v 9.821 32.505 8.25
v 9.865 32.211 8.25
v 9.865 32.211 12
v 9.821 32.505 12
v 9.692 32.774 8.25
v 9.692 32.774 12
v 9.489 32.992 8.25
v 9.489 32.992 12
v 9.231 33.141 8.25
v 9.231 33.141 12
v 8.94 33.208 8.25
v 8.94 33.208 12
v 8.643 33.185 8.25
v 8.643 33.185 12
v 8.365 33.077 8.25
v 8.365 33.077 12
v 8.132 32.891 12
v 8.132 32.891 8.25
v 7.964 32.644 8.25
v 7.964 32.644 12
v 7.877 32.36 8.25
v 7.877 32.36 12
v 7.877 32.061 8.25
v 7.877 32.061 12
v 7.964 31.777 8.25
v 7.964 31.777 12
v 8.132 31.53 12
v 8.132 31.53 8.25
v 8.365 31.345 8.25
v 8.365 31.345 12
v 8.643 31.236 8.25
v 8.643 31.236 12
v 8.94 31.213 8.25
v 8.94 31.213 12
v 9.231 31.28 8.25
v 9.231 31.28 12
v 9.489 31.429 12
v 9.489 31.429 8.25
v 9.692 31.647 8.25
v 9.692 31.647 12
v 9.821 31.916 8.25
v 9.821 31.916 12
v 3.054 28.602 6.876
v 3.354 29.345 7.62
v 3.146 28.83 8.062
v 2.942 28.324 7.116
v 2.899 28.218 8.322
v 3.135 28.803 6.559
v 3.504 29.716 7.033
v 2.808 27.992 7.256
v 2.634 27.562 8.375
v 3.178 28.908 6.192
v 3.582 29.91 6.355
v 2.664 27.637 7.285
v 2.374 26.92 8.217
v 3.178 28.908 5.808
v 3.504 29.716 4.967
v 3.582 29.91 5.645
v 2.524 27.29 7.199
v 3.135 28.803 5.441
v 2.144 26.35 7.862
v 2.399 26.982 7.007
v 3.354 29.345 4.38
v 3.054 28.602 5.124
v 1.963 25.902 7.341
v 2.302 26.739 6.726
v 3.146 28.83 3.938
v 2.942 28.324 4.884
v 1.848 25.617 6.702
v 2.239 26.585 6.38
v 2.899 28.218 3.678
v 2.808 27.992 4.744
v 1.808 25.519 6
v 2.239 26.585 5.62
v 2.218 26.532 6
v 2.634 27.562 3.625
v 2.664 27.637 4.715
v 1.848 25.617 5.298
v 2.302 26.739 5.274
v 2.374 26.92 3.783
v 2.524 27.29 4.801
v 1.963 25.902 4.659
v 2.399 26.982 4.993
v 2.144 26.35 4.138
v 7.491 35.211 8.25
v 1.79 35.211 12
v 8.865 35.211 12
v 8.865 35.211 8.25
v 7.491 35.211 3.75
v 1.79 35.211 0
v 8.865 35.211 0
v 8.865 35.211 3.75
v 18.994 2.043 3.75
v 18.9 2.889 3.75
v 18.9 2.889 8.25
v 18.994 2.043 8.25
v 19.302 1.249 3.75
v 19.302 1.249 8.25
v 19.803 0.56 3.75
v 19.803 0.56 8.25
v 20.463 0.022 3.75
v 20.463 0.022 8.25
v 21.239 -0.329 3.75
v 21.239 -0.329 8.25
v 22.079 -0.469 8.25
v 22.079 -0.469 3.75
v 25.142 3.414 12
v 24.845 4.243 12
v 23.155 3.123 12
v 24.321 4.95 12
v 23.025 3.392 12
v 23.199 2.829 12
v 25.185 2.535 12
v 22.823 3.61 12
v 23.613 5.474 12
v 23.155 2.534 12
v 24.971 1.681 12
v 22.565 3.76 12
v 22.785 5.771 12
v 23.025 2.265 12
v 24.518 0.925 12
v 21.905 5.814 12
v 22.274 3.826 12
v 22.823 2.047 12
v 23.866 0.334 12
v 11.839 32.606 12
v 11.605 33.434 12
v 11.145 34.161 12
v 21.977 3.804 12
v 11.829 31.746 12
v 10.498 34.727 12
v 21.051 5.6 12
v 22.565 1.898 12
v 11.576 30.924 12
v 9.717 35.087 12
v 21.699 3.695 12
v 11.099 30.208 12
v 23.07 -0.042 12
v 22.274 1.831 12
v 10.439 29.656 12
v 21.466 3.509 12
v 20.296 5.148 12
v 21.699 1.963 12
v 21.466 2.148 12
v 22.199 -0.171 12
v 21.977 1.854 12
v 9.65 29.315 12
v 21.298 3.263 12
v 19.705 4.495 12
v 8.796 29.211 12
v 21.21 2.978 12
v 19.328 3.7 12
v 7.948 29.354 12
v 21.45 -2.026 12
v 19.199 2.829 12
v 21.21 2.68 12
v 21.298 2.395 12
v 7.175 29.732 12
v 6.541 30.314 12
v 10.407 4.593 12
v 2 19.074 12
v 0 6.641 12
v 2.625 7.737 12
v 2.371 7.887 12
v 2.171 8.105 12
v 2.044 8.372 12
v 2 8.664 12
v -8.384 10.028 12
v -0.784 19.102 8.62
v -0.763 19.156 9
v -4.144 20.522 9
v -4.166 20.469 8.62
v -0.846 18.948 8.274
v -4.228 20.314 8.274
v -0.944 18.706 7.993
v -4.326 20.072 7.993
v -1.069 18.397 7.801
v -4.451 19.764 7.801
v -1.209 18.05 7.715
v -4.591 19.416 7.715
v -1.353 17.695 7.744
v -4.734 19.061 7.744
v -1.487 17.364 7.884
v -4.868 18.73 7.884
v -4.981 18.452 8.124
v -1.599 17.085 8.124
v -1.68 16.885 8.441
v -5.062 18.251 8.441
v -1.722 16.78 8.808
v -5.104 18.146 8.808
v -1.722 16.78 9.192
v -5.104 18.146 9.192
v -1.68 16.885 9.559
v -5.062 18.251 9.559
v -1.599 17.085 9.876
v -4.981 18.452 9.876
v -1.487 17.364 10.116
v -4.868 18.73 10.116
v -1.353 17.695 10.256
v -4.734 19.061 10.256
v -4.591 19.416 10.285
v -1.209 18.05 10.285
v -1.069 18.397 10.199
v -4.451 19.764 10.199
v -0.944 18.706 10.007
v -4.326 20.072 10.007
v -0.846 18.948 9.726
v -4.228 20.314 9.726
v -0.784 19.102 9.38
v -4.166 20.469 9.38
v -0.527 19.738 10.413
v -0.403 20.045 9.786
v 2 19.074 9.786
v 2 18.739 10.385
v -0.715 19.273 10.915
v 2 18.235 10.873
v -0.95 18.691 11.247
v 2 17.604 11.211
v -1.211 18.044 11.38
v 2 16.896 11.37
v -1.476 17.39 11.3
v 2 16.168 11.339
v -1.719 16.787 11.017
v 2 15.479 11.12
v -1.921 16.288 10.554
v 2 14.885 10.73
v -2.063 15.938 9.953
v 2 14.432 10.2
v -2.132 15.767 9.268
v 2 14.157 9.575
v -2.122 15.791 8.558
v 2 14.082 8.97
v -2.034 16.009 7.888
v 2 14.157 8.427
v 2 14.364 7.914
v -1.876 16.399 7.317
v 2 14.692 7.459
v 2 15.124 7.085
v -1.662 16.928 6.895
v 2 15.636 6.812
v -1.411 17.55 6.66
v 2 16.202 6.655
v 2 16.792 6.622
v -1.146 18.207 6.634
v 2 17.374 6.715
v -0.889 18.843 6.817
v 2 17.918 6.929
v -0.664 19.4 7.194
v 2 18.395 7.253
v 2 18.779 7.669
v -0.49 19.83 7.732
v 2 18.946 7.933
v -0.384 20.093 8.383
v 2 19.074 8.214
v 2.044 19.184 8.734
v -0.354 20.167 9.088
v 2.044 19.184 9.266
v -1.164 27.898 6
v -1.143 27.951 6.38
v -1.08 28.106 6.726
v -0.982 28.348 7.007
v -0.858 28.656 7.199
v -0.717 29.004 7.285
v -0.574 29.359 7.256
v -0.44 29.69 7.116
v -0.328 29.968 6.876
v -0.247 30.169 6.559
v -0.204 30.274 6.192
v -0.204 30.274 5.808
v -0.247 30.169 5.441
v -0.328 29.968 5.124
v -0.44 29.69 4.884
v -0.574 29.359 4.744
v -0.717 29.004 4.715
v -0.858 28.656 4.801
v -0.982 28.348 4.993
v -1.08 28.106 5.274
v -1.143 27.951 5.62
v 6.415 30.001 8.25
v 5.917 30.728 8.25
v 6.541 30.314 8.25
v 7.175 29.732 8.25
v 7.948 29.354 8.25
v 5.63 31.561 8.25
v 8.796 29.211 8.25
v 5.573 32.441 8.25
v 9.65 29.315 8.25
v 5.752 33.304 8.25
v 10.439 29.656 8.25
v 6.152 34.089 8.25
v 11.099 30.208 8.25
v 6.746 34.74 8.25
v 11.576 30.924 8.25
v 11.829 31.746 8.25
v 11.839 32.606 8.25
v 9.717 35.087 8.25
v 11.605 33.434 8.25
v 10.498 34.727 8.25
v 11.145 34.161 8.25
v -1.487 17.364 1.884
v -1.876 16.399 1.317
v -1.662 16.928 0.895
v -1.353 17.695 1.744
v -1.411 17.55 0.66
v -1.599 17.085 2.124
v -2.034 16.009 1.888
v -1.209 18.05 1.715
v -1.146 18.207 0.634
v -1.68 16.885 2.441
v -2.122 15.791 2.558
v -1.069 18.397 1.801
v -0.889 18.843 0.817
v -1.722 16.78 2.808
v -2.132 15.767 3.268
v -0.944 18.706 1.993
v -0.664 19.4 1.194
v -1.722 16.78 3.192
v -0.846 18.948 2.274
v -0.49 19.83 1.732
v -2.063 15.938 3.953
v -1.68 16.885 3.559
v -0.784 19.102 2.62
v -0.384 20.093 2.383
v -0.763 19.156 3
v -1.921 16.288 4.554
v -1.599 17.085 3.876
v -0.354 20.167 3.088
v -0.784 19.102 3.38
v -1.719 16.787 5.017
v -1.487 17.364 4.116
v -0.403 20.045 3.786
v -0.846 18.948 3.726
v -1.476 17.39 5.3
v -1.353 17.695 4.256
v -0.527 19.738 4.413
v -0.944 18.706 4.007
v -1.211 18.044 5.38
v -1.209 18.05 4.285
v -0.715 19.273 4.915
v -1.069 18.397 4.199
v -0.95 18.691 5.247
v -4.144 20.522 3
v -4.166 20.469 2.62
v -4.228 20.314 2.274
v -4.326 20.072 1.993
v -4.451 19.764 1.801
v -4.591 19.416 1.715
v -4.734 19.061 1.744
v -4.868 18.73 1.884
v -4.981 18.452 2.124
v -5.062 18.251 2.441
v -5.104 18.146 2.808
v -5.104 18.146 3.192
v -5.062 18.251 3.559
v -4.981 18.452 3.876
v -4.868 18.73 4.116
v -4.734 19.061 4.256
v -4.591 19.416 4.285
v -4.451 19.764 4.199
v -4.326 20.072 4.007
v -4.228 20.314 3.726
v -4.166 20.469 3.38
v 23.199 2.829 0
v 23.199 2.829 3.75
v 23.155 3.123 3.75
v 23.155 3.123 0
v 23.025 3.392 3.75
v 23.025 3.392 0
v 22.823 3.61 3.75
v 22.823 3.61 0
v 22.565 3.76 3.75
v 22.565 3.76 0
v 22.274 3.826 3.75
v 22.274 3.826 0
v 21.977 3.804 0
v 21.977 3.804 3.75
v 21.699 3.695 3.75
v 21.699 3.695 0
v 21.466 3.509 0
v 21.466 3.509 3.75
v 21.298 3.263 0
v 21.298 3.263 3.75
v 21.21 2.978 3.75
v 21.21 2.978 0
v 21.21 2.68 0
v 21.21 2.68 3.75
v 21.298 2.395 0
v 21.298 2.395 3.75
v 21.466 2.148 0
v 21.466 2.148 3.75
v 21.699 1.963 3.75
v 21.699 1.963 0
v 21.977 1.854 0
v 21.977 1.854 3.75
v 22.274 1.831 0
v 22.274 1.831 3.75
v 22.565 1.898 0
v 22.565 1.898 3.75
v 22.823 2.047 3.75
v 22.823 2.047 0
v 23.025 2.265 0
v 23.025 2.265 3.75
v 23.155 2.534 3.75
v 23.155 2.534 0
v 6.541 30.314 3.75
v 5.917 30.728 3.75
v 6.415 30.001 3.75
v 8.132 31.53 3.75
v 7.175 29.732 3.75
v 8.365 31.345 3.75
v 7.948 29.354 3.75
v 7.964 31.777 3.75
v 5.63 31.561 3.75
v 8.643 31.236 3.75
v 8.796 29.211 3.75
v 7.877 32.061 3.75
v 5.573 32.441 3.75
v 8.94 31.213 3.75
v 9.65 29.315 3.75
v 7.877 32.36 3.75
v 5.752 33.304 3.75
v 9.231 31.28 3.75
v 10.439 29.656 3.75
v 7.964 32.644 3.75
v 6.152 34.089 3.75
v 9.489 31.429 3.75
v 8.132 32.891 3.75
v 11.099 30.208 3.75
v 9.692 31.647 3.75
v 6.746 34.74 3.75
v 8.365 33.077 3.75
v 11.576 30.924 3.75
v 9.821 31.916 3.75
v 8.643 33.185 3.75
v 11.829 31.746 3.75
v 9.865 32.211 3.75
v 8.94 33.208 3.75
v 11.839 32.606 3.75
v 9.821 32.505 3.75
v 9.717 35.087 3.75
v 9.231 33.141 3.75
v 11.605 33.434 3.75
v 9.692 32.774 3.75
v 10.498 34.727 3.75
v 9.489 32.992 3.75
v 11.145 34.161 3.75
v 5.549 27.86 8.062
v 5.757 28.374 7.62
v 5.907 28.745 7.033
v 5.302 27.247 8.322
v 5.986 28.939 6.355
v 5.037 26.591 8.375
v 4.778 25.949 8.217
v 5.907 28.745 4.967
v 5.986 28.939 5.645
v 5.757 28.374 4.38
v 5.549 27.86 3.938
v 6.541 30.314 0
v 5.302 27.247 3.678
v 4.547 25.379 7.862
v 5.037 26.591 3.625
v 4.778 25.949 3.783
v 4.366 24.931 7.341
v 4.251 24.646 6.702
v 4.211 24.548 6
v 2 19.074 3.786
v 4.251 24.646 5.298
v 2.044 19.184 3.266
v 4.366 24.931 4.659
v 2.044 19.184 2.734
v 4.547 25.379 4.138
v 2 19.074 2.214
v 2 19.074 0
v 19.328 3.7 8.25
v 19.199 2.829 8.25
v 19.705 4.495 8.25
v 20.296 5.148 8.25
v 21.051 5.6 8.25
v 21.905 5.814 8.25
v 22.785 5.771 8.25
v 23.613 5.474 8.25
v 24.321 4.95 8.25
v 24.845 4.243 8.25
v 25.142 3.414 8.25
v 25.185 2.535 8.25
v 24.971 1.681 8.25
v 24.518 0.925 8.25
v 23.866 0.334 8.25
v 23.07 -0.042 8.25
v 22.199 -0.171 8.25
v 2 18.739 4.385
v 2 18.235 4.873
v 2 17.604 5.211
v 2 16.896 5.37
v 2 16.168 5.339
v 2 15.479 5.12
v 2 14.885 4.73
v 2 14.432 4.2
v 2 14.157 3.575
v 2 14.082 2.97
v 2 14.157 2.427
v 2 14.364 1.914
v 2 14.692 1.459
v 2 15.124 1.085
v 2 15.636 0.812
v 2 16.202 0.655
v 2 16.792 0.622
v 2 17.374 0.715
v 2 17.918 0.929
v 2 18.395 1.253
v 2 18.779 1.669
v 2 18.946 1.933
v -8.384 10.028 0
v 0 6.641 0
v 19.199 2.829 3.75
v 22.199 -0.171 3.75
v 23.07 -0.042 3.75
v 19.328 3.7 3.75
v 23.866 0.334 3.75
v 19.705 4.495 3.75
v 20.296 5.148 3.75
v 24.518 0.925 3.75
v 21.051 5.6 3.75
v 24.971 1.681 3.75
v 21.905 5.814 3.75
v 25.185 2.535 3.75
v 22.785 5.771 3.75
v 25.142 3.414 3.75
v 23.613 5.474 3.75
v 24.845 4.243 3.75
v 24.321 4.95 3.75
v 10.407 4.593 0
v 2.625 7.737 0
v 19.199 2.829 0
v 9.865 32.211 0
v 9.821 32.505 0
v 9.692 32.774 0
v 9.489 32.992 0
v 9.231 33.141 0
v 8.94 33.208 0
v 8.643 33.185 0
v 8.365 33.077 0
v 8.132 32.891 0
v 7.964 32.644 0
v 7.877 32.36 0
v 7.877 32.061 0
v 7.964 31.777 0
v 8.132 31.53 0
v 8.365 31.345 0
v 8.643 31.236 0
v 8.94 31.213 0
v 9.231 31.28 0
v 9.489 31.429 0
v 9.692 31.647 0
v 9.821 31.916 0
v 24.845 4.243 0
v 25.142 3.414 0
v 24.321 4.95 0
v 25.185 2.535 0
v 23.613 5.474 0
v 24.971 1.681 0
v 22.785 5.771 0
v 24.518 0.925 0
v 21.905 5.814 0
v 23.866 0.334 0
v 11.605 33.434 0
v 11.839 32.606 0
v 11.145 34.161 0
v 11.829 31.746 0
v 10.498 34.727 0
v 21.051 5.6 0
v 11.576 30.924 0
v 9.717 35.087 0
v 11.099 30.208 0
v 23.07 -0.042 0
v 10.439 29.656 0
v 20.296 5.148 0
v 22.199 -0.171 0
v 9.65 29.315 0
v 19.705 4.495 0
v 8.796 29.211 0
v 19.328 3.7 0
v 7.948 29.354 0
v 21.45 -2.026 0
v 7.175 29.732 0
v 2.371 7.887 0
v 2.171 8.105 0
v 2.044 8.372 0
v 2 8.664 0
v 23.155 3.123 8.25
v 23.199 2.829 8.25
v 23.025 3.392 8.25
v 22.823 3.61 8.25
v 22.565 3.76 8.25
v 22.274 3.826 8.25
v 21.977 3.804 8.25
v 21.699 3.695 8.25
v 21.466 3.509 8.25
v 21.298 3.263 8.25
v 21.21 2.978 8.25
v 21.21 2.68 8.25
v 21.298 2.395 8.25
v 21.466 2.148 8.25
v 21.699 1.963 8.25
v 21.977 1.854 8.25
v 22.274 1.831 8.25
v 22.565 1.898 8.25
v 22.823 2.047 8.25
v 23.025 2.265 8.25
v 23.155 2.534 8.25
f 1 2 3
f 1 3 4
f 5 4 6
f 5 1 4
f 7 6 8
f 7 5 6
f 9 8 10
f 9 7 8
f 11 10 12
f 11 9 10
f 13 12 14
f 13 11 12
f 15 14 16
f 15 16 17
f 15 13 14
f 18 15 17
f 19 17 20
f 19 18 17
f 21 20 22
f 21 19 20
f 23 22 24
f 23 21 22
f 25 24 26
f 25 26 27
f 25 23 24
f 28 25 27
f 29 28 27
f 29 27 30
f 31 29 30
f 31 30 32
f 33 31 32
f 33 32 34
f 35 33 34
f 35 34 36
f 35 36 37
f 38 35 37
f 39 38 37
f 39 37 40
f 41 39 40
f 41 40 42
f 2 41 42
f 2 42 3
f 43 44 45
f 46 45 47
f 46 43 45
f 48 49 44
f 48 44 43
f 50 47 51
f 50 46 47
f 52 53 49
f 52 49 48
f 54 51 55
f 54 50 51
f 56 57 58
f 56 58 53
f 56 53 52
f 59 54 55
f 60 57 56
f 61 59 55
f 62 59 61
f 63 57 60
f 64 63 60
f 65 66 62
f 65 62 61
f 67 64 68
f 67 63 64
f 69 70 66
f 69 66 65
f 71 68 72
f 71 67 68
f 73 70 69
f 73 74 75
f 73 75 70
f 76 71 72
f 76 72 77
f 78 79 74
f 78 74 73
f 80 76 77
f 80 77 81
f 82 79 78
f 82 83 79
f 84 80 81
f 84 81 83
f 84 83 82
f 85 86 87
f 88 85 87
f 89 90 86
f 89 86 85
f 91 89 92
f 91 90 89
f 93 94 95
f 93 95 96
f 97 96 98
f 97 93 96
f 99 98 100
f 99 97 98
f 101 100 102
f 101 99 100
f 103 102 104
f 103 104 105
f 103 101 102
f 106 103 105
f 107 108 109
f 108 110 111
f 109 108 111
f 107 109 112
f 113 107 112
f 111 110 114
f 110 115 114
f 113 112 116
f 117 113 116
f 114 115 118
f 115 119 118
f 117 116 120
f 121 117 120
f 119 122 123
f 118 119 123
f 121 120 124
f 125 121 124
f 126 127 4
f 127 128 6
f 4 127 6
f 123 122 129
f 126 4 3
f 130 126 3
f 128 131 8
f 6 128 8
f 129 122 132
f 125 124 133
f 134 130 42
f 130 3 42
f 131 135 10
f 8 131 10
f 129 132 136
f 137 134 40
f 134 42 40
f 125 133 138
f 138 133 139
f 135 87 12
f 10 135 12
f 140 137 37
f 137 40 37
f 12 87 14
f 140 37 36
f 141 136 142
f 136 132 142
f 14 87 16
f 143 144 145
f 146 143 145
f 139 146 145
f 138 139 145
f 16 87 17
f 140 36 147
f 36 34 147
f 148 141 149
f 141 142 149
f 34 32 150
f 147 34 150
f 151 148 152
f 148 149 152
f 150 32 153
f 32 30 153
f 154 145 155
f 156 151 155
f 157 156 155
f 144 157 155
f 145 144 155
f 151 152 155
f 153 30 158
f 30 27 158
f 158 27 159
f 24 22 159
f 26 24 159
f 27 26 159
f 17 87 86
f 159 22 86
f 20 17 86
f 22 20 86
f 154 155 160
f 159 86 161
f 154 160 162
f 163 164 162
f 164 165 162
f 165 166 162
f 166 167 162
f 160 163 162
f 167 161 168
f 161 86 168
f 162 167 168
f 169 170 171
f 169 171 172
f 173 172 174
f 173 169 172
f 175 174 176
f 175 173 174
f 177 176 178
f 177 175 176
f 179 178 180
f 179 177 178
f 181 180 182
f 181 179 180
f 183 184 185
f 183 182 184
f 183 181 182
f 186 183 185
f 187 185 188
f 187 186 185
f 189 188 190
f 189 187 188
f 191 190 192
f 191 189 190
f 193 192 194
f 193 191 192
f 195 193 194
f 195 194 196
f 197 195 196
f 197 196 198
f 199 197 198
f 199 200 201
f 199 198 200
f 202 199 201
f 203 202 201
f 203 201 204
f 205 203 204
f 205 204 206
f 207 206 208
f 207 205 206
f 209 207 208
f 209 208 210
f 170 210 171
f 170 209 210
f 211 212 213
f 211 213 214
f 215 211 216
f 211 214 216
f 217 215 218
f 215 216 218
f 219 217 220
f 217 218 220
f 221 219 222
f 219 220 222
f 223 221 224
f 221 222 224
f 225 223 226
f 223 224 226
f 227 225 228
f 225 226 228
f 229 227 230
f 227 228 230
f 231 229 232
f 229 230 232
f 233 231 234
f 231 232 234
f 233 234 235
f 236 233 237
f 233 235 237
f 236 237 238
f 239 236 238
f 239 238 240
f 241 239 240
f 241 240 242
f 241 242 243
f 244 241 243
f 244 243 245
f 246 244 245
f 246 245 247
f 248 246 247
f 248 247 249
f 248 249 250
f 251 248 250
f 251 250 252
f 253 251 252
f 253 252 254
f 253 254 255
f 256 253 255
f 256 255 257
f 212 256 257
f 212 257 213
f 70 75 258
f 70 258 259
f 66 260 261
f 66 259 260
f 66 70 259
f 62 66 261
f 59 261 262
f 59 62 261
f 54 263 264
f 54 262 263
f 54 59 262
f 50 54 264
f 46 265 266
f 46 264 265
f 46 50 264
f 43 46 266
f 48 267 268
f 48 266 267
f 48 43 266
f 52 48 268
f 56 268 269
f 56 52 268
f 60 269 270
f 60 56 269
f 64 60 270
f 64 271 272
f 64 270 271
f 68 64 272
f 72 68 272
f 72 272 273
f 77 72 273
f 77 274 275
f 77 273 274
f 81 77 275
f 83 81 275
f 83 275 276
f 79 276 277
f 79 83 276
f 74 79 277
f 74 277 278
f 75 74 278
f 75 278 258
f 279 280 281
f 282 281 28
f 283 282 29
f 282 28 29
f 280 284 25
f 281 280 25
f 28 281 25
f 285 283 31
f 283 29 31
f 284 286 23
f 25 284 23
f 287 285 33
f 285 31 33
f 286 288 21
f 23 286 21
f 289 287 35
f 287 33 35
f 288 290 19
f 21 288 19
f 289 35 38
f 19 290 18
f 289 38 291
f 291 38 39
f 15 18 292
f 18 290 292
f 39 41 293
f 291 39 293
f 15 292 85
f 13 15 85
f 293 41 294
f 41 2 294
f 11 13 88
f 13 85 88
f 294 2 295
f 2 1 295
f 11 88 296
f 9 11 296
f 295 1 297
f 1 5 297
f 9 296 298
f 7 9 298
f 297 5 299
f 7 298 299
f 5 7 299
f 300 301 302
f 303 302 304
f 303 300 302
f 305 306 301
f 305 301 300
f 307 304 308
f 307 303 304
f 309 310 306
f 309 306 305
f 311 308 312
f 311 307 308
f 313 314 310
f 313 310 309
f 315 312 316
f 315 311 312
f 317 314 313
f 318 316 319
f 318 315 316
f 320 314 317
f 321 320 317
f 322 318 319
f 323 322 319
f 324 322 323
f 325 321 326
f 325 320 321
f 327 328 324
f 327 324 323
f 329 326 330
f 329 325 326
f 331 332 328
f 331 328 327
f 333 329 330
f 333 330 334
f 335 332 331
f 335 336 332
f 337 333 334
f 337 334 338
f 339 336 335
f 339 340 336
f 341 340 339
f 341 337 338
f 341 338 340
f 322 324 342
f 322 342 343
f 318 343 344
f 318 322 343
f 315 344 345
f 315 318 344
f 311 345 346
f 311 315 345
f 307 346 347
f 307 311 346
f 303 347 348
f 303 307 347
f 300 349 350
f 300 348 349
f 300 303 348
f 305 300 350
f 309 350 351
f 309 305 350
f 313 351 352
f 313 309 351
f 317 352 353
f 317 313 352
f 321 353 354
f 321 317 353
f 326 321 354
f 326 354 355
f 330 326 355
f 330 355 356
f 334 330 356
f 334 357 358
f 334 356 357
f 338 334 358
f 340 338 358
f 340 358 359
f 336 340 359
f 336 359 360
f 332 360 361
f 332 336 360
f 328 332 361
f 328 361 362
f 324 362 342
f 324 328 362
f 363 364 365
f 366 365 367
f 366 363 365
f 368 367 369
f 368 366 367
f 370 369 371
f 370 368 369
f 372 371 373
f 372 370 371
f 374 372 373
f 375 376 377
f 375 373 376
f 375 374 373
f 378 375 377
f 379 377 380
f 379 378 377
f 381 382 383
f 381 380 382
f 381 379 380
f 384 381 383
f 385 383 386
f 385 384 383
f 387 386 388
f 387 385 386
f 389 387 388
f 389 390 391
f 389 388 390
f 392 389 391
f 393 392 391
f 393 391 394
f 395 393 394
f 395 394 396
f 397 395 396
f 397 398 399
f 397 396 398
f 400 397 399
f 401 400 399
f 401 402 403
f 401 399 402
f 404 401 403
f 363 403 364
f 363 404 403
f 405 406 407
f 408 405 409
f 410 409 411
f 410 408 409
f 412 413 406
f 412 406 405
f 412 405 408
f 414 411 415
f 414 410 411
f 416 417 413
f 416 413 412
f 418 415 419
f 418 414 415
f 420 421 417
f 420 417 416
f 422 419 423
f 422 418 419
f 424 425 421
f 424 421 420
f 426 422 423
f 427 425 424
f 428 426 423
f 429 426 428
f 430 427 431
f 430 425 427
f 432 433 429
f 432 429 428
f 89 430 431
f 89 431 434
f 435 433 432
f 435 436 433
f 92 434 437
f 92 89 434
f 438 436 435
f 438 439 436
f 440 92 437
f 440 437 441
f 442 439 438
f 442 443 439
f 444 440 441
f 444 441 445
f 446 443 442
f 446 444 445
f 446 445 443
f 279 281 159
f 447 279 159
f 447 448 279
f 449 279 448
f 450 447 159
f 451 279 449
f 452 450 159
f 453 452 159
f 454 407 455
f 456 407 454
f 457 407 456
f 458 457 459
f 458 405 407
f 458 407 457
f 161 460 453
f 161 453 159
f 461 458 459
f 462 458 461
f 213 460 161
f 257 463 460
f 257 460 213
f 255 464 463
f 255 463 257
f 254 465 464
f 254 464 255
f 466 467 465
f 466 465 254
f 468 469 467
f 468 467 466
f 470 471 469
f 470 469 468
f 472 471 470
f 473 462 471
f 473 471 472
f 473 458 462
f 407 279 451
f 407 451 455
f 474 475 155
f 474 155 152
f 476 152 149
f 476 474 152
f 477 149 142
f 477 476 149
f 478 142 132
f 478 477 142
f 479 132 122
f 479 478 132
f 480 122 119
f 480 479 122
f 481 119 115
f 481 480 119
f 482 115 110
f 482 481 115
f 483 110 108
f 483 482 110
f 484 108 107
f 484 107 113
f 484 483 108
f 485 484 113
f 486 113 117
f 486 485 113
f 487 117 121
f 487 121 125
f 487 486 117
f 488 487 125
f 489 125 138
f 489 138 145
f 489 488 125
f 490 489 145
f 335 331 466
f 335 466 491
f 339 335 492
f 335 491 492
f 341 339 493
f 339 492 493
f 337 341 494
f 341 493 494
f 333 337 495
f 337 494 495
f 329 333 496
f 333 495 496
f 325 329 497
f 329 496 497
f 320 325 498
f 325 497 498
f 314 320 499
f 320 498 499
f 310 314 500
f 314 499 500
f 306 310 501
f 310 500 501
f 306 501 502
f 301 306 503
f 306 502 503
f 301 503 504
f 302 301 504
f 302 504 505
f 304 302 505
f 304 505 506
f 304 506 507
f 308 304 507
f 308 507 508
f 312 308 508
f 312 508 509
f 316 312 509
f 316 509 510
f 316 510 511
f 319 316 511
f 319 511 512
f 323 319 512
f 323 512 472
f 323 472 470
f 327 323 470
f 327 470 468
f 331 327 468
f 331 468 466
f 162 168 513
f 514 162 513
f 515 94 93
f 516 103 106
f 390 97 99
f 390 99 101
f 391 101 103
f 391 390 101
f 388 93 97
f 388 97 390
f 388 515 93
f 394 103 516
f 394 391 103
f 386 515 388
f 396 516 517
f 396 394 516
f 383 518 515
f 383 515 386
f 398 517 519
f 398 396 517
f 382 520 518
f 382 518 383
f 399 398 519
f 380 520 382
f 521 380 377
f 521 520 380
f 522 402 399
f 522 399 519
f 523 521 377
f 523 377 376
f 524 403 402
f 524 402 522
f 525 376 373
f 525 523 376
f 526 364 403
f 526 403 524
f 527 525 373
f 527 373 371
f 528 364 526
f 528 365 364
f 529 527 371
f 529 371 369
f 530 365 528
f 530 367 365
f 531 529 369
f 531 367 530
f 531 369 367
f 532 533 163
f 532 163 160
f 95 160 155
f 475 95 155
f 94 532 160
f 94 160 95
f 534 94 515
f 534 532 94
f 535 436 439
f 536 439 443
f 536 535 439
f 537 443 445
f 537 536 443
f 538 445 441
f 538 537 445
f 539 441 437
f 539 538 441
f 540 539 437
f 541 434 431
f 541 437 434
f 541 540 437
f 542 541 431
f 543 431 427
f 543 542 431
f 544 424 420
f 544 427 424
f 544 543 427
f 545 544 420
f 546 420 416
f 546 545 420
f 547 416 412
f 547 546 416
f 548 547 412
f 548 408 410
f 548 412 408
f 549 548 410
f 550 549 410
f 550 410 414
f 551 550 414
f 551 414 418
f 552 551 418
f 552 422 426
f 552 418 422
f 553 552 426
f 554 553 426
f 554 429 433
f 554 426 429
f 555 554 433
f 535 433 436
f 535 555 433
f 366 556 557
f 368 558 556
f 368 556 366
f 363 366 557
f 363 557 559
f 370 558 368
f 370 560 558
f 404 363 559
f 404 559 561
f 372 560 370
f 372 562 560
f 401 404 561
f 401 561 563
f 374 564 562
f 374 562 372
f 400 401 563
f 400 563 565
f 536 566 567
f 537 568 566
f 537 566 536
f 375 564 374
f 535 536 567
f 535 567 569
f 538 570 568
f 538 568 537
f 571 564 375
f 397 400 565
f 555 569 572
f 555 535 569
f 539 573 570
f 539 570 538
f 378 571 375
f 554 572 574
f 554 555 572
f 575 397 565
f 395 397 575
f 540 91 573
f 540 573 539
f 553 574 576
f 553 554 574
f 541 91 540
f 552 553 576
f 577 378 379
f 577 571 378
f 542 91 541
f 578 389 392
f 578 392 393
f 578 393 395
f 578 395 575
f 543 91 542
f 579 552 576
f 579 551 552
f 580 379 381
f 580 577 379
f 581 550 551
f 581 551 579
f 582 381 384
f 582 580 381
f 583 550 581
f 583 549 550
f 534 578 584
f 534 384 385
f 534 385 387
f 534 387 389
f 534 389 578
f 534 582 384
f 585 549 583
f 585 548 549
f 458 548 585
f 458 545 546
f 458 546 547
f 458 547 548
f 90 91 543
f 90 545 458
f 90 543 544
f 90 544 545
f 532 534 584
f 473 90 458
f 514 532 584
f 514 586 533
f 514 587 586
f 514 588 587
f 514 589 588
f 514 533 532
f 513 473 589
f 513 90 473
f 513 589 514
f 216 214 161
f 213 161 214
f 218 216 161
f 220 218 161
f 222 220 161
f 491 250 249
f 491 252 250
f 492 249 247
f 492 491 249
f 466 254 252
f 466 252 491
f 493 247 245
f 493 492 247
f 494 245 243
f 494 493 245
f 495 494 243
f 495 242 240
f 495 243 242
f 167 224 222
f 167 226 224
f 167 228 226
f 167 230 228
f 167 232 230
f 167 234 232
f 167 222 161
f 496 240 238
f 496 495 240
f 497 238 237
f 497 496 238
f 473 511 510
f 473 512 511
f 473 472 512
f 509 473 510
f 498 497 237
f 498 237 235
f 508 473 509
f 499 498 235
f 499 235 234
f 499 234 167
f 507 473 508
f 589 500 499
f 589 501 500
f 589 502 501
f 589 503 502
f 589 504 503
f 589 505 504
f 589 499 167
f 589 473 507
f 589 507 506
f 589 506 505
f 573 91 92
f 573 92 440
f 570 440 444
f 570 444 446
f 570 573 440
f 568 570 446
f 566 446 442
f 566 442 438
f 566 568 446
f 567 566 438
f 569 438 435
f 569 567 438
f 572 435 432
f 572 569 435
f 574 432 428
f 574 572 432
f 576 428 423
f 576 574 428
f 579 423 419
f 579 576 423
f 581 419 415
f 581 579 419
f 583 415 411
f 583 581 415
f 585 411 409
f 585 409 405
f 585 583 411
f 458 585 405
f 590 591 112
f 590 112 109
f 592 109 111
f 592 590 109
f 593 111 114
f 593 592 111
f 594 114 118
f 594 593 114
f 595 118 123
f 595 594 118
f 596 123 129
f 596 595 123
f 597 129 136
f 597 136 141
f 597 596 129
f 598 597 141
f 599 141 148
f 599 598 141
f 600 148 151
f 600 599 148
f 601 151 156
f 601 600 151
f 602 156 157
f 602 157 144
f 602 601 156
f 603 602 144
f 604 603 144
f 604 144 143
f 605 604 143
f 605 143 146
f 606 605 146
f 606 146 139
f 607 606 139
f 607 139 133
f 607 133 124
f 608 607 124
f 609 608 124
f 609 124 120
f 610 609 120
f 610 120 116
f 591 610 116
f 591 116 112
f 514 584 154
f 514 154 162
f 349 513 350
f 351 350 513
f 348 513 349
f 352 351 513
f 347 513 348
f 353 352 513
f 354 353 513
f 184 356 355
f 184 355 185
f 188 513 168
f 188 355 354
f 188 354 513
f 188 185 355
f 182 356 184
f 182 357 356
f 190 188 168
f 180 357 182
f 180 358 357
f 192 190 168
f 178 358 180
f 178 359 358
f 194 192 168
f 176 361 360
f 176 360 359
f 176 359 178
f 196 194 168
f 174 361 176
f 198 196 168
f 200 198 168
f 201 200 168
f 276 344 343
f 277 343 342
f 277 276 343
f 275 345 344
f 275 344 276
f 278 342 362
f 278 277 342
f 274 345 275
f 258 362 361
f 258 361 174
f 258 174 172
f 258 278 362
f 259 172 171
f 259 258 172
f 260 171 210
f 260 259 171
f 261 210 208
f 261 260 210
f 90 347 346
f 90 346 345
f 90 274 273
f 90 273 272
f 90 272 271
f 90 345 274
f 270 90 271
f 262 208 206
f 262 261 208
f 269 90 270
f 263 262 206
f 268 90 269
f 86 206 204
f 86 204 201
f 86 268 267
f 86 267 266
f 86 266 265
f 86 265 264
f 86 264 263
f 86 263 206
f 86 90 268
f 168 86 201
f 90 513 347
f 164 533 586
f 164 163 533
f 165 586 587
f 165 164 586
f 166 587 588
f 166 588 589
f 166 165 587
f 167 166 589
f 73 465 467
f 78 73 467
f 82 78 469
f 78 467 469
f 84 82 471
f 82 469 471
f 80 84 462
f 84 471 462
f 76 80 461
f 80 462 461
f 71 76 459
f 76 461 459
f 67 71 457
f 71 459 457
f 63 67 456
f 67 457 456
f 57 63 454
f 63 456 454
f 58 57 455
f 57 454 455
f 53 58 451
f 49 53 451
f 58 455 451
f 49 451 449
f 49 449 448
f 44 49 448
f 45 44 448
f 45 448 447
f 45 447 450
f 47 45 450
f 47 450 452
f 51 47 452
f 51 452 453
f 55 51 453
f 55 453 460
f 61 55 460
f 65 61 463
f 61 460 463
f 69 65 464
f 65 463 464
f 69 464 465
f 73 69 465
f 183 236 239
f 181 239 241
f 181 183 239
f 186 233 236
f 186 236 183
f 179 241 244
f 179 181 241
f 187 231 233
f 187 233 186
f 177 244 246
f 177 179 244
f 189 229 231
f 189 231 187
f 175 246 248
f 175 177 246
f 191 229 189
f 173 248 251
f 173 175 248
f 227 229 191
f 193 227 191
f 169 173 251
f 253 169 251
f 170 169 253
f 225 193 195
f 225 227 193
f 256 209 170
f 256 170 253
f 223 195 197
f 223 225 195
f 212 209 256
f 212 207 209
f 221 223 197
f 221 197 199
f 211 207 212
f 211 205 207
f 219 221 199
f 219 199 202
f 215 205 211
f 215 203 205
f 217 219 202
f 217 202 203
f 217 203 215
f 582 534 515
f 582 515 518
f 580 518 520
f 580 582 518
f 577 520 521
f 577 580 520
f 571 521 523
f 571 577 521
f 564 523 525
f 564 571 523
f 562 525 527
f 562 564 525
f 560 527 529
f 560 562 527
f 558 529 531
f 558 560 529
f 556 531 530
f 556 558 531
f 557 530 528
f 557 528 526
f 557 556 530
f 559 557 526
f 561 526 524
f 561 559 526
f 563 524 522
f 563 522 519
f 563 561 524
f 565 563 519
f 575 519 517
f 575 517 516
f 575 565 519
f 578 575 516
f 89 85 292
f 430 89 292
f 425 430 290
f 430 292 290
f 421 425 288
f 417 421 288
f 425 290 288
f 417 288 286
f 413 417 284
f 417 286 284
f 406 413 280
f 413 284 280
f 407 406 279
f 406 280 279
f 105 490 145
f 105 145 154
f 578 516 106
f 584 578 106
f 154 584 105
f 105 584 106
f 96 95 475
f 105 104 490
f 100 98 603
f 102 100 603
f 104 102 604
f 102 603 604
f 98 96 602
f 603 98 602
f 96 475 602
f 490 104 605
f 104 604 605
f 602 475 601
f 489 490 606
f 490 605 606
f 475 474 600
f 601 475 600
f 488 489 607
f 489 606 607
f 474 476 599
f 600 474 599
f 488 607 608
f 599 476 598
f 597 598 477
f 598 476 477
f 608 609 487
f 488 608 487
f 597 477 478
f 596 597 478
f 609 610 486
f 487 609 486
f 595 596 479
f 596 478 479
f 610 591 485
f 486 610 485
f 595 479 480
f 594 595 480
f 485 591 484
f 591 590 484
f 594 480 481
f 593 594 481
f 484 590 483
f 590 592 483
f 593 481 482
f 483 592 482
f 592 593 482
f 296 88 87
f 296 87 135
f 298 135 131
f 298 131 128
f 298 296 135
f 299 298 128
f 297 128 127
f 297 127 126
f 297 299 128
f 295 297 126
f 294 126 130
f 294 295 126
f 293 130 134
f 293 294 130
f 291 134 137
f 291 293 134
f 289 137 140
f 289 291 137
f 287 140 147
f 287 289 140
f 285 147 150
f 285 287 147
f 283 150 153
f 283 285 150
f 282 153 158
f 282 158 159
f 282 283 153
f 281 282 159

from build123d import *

# Parameters (mm, degrees)
SKETCH1_R                     = 1
BOSS_EXTRUDE1_DEPTH           = 12
SKETCH2_R                     = 3.3
CUT_EXTRUDE1_DEPTH            = 2.25
CUT_EXTRUDE1_DEPTH_BACK       = 2.25
FILLET3_R                     = 1
BOSS_EXTRUDE2_REACH           = 51.61
SKETCH4_W                     = 12
SKETCH4_H                     = 26.489515253
HOLE_SKETCH_R                 = 1.288405797
SCREW_SHAFT_HOLES_DEPTH       = 42.118659034
SCREW_SHAFT_HOLES_DEPTH_BACK  = 42.118659034
SKETCH5_R                     = 2.38125
SCREW_COUNTERBORES_DEPTH      = 5
SCREW_COUNTERBORES_DEPTH_BACK = 2.591836735
SKETCH6_W                     = 18.725223932
SKETCH6_H                     = 35.053619202
CUT_EXTRUDE2_DEPTH            = 1.66


with BuildPart() as part:
    # Sketch1 → Boss-Extrude1 (new body)
    with BuildSketch(Plane.XY):
        with BuildLine():
            Line((0, 6.640670196), (0, 35.210532713))
            Line((0, 35.210532713), (8.865440207, 35.210532713))
            ThreePointArc((8.865440207, 35.210532713), (11.575609349, 30.924071201), (6.541088012, 30.31385486))
            Line((6.541088012, 30.31385486), (2, 19.07426762))
            Line((2, 19.07426762), (2, 7.989687229))
            Line((2, 7.989687229), (10.406938735, 4.593063501))
            Line((10.406938735, 4.593063501), (19.199232805, 2.828667434))
            ThreePointArc((19.199232805, 2.828667434), (24.320553148, 4.949987778), (22.199232805, -0.171332566))
            Line((22.199232805, -0.171332566), (21.450019618, -2.025700275))
            Line((21.450019618, -2.025700275), (0, 6.640670196))
        make_face()
        with Locations((8.865440207, 32.210532713)):
            Circle(SKETCH1_R, mode=Mode.SUBTRACT)
        with Locations((22.199232805, 2.828667434)):
            Circle(SKETCH1_R, mode=Mode.SUBTRACT)
    extrude(amount=BOSS_EXTRUDE1_DEPTH)

    # Sketch2 → Cut-Extrude1 (cut, two sides)
    with BuildSketch(Plane.XY.offset(6)) as cut_extrude1_sk:
        with Locations((8.865440207, 32.210532713)):
            Circle(SKETCH2_R)
        with Locations((22.199232805, 2.828667434)):
            Circle(SKETCH2_R)
    extrude(amount=CUT_EXTRUDE1_DEPTH, mode=Mode.SUBTRACT)
    extrude(cut_extrude1_sk.sketch, amount=-CUT_EXTRUDE1_DEPTH_BACK, mode=Mode.SUBTRACT)

    # Fillet3
    fillet3_edges = [part.edges().sort_by_distance(p)[0] for p in [
        (2, 7.989687229, 6),
    ]]
    fillet(fillet3_edges, radius=FILLET3_R)

    # Boss-Extrude2: up to this face of the body (flat: up to its plane)
    boss_extrude2_end = Plane(part.part.faces().sort_by_distance((0, 20.925601454, 6))[0])
    # Sketch4 → Boss-Extrude2 (add, up to the picked face)
    with BuildSketch(Plane(origin=(-12.229645639, 4.941097571, 0), x_dir=(0, 0, -1), z_dir=(-0.9271838545667871, 0.37460659341591285, 0)), mode=Mode.PRIVATE) as boss_extrude2_sk1:
        with Locations((-6, -19.401879815)):
            Rectangle(SKETCH4_W, SKETCH4_H)
    boss_extrude2_tool1 = split(extrude(boss_extrude2_sk1.sketch, amount=-BOSS_EXTRUDE2_REACH, mode=Mode.PRIVATE), bisect_by=boss_extrude2_end, keep=Keep.BOTH, mode=Mode.PRIVATE)
    add(boss_extrude2_tool1.solids().sort_by(Axis((-4.961574, 22.930207, 6), (0.9271838545667871, -0.37460659341591285, 0)))[0])

    # Hole sketch → Screw shaft holes (cut, two sides)
    with BuildSketch(Plane(origin=(7.68361222, 33.141701506, 0), x_dir=(0, 0, -1), z_dir=(-0.927183854566786, 0.3746065934159158, 0))) as screw_shaft_holes_sk:
        with Locations(Location((-9, 17.420162392, 0), (0, 0, 270))):
            Circle(HOLE_SKETCH_R)
        with Locations(Location((-3, 17.420162392, 0), (0, 0, 270))):
            Circle(HOLE_SKETCH_R)
        with Locations(Location((-6, 6.887654186, 0), (0, 0, 90))):
            Circle(HOLE_SKETCH_R)
    extrude(amount=SCREW_SHAFT_HOLES_DEPTH, mode=Mode.SUBTRACT)
    extrude(screw_shaft_holes_sk.sketch, amount=-SCREW_SHAFT_HOLES_DEPTH_BACK, mode=Mode.SUBTRACT)

    # Sketch5 → Screw counterbores (cut, two sides)
    with BuildSketch(Plane(origin=(-4.905710031, 1.982035509, 0), x_dir=(0, 0, -1), z_dir=(0.927183854566786, -0.3746065934159158, 0))) as screw_counterbores_sk:
        with Locations(Location((-6, 26.719128162, 0), (0, 0, 270))):
            Circle(SKETCH5_R)
        with Locations(Location((-9, 16.186619957, 0), (0, 0, 109.262094827))):
            Circle(SKETCH5_R)
        with Locations(Location((-3, 16.186619957, 0), (0, 0, 109.262094827))):
            Circle(SKETCH5_R)
    extrude(amount=SCREW_COUNTERBORES_DEPTH, mode=Mode.SUBTRACT)
    extrude(screw_counterbores_sk.sketch, amount=-SCREW_COUNTERBORES_DEPTH_BACK, mode=Mode.SUBTRACT)

    # Sketch6 → Cut-Extrude2 (cut)
    with BuildSketch(Plane(origin=(-12.229645639, 4.941097571, 0), x_dir=(0, 0, 1), z_dir=(-0.9271838545667871, 0.37460659341591296, 0))):
        with Locations((5.962549552, 20.221942298)):
            Rectangle(SKETCH6_W, SKETCH6_H)
    extrude(amount=-CUT_EXTRUDE2_DEPTH, mode=Mode.SUBTRACT)


solid = part.part
